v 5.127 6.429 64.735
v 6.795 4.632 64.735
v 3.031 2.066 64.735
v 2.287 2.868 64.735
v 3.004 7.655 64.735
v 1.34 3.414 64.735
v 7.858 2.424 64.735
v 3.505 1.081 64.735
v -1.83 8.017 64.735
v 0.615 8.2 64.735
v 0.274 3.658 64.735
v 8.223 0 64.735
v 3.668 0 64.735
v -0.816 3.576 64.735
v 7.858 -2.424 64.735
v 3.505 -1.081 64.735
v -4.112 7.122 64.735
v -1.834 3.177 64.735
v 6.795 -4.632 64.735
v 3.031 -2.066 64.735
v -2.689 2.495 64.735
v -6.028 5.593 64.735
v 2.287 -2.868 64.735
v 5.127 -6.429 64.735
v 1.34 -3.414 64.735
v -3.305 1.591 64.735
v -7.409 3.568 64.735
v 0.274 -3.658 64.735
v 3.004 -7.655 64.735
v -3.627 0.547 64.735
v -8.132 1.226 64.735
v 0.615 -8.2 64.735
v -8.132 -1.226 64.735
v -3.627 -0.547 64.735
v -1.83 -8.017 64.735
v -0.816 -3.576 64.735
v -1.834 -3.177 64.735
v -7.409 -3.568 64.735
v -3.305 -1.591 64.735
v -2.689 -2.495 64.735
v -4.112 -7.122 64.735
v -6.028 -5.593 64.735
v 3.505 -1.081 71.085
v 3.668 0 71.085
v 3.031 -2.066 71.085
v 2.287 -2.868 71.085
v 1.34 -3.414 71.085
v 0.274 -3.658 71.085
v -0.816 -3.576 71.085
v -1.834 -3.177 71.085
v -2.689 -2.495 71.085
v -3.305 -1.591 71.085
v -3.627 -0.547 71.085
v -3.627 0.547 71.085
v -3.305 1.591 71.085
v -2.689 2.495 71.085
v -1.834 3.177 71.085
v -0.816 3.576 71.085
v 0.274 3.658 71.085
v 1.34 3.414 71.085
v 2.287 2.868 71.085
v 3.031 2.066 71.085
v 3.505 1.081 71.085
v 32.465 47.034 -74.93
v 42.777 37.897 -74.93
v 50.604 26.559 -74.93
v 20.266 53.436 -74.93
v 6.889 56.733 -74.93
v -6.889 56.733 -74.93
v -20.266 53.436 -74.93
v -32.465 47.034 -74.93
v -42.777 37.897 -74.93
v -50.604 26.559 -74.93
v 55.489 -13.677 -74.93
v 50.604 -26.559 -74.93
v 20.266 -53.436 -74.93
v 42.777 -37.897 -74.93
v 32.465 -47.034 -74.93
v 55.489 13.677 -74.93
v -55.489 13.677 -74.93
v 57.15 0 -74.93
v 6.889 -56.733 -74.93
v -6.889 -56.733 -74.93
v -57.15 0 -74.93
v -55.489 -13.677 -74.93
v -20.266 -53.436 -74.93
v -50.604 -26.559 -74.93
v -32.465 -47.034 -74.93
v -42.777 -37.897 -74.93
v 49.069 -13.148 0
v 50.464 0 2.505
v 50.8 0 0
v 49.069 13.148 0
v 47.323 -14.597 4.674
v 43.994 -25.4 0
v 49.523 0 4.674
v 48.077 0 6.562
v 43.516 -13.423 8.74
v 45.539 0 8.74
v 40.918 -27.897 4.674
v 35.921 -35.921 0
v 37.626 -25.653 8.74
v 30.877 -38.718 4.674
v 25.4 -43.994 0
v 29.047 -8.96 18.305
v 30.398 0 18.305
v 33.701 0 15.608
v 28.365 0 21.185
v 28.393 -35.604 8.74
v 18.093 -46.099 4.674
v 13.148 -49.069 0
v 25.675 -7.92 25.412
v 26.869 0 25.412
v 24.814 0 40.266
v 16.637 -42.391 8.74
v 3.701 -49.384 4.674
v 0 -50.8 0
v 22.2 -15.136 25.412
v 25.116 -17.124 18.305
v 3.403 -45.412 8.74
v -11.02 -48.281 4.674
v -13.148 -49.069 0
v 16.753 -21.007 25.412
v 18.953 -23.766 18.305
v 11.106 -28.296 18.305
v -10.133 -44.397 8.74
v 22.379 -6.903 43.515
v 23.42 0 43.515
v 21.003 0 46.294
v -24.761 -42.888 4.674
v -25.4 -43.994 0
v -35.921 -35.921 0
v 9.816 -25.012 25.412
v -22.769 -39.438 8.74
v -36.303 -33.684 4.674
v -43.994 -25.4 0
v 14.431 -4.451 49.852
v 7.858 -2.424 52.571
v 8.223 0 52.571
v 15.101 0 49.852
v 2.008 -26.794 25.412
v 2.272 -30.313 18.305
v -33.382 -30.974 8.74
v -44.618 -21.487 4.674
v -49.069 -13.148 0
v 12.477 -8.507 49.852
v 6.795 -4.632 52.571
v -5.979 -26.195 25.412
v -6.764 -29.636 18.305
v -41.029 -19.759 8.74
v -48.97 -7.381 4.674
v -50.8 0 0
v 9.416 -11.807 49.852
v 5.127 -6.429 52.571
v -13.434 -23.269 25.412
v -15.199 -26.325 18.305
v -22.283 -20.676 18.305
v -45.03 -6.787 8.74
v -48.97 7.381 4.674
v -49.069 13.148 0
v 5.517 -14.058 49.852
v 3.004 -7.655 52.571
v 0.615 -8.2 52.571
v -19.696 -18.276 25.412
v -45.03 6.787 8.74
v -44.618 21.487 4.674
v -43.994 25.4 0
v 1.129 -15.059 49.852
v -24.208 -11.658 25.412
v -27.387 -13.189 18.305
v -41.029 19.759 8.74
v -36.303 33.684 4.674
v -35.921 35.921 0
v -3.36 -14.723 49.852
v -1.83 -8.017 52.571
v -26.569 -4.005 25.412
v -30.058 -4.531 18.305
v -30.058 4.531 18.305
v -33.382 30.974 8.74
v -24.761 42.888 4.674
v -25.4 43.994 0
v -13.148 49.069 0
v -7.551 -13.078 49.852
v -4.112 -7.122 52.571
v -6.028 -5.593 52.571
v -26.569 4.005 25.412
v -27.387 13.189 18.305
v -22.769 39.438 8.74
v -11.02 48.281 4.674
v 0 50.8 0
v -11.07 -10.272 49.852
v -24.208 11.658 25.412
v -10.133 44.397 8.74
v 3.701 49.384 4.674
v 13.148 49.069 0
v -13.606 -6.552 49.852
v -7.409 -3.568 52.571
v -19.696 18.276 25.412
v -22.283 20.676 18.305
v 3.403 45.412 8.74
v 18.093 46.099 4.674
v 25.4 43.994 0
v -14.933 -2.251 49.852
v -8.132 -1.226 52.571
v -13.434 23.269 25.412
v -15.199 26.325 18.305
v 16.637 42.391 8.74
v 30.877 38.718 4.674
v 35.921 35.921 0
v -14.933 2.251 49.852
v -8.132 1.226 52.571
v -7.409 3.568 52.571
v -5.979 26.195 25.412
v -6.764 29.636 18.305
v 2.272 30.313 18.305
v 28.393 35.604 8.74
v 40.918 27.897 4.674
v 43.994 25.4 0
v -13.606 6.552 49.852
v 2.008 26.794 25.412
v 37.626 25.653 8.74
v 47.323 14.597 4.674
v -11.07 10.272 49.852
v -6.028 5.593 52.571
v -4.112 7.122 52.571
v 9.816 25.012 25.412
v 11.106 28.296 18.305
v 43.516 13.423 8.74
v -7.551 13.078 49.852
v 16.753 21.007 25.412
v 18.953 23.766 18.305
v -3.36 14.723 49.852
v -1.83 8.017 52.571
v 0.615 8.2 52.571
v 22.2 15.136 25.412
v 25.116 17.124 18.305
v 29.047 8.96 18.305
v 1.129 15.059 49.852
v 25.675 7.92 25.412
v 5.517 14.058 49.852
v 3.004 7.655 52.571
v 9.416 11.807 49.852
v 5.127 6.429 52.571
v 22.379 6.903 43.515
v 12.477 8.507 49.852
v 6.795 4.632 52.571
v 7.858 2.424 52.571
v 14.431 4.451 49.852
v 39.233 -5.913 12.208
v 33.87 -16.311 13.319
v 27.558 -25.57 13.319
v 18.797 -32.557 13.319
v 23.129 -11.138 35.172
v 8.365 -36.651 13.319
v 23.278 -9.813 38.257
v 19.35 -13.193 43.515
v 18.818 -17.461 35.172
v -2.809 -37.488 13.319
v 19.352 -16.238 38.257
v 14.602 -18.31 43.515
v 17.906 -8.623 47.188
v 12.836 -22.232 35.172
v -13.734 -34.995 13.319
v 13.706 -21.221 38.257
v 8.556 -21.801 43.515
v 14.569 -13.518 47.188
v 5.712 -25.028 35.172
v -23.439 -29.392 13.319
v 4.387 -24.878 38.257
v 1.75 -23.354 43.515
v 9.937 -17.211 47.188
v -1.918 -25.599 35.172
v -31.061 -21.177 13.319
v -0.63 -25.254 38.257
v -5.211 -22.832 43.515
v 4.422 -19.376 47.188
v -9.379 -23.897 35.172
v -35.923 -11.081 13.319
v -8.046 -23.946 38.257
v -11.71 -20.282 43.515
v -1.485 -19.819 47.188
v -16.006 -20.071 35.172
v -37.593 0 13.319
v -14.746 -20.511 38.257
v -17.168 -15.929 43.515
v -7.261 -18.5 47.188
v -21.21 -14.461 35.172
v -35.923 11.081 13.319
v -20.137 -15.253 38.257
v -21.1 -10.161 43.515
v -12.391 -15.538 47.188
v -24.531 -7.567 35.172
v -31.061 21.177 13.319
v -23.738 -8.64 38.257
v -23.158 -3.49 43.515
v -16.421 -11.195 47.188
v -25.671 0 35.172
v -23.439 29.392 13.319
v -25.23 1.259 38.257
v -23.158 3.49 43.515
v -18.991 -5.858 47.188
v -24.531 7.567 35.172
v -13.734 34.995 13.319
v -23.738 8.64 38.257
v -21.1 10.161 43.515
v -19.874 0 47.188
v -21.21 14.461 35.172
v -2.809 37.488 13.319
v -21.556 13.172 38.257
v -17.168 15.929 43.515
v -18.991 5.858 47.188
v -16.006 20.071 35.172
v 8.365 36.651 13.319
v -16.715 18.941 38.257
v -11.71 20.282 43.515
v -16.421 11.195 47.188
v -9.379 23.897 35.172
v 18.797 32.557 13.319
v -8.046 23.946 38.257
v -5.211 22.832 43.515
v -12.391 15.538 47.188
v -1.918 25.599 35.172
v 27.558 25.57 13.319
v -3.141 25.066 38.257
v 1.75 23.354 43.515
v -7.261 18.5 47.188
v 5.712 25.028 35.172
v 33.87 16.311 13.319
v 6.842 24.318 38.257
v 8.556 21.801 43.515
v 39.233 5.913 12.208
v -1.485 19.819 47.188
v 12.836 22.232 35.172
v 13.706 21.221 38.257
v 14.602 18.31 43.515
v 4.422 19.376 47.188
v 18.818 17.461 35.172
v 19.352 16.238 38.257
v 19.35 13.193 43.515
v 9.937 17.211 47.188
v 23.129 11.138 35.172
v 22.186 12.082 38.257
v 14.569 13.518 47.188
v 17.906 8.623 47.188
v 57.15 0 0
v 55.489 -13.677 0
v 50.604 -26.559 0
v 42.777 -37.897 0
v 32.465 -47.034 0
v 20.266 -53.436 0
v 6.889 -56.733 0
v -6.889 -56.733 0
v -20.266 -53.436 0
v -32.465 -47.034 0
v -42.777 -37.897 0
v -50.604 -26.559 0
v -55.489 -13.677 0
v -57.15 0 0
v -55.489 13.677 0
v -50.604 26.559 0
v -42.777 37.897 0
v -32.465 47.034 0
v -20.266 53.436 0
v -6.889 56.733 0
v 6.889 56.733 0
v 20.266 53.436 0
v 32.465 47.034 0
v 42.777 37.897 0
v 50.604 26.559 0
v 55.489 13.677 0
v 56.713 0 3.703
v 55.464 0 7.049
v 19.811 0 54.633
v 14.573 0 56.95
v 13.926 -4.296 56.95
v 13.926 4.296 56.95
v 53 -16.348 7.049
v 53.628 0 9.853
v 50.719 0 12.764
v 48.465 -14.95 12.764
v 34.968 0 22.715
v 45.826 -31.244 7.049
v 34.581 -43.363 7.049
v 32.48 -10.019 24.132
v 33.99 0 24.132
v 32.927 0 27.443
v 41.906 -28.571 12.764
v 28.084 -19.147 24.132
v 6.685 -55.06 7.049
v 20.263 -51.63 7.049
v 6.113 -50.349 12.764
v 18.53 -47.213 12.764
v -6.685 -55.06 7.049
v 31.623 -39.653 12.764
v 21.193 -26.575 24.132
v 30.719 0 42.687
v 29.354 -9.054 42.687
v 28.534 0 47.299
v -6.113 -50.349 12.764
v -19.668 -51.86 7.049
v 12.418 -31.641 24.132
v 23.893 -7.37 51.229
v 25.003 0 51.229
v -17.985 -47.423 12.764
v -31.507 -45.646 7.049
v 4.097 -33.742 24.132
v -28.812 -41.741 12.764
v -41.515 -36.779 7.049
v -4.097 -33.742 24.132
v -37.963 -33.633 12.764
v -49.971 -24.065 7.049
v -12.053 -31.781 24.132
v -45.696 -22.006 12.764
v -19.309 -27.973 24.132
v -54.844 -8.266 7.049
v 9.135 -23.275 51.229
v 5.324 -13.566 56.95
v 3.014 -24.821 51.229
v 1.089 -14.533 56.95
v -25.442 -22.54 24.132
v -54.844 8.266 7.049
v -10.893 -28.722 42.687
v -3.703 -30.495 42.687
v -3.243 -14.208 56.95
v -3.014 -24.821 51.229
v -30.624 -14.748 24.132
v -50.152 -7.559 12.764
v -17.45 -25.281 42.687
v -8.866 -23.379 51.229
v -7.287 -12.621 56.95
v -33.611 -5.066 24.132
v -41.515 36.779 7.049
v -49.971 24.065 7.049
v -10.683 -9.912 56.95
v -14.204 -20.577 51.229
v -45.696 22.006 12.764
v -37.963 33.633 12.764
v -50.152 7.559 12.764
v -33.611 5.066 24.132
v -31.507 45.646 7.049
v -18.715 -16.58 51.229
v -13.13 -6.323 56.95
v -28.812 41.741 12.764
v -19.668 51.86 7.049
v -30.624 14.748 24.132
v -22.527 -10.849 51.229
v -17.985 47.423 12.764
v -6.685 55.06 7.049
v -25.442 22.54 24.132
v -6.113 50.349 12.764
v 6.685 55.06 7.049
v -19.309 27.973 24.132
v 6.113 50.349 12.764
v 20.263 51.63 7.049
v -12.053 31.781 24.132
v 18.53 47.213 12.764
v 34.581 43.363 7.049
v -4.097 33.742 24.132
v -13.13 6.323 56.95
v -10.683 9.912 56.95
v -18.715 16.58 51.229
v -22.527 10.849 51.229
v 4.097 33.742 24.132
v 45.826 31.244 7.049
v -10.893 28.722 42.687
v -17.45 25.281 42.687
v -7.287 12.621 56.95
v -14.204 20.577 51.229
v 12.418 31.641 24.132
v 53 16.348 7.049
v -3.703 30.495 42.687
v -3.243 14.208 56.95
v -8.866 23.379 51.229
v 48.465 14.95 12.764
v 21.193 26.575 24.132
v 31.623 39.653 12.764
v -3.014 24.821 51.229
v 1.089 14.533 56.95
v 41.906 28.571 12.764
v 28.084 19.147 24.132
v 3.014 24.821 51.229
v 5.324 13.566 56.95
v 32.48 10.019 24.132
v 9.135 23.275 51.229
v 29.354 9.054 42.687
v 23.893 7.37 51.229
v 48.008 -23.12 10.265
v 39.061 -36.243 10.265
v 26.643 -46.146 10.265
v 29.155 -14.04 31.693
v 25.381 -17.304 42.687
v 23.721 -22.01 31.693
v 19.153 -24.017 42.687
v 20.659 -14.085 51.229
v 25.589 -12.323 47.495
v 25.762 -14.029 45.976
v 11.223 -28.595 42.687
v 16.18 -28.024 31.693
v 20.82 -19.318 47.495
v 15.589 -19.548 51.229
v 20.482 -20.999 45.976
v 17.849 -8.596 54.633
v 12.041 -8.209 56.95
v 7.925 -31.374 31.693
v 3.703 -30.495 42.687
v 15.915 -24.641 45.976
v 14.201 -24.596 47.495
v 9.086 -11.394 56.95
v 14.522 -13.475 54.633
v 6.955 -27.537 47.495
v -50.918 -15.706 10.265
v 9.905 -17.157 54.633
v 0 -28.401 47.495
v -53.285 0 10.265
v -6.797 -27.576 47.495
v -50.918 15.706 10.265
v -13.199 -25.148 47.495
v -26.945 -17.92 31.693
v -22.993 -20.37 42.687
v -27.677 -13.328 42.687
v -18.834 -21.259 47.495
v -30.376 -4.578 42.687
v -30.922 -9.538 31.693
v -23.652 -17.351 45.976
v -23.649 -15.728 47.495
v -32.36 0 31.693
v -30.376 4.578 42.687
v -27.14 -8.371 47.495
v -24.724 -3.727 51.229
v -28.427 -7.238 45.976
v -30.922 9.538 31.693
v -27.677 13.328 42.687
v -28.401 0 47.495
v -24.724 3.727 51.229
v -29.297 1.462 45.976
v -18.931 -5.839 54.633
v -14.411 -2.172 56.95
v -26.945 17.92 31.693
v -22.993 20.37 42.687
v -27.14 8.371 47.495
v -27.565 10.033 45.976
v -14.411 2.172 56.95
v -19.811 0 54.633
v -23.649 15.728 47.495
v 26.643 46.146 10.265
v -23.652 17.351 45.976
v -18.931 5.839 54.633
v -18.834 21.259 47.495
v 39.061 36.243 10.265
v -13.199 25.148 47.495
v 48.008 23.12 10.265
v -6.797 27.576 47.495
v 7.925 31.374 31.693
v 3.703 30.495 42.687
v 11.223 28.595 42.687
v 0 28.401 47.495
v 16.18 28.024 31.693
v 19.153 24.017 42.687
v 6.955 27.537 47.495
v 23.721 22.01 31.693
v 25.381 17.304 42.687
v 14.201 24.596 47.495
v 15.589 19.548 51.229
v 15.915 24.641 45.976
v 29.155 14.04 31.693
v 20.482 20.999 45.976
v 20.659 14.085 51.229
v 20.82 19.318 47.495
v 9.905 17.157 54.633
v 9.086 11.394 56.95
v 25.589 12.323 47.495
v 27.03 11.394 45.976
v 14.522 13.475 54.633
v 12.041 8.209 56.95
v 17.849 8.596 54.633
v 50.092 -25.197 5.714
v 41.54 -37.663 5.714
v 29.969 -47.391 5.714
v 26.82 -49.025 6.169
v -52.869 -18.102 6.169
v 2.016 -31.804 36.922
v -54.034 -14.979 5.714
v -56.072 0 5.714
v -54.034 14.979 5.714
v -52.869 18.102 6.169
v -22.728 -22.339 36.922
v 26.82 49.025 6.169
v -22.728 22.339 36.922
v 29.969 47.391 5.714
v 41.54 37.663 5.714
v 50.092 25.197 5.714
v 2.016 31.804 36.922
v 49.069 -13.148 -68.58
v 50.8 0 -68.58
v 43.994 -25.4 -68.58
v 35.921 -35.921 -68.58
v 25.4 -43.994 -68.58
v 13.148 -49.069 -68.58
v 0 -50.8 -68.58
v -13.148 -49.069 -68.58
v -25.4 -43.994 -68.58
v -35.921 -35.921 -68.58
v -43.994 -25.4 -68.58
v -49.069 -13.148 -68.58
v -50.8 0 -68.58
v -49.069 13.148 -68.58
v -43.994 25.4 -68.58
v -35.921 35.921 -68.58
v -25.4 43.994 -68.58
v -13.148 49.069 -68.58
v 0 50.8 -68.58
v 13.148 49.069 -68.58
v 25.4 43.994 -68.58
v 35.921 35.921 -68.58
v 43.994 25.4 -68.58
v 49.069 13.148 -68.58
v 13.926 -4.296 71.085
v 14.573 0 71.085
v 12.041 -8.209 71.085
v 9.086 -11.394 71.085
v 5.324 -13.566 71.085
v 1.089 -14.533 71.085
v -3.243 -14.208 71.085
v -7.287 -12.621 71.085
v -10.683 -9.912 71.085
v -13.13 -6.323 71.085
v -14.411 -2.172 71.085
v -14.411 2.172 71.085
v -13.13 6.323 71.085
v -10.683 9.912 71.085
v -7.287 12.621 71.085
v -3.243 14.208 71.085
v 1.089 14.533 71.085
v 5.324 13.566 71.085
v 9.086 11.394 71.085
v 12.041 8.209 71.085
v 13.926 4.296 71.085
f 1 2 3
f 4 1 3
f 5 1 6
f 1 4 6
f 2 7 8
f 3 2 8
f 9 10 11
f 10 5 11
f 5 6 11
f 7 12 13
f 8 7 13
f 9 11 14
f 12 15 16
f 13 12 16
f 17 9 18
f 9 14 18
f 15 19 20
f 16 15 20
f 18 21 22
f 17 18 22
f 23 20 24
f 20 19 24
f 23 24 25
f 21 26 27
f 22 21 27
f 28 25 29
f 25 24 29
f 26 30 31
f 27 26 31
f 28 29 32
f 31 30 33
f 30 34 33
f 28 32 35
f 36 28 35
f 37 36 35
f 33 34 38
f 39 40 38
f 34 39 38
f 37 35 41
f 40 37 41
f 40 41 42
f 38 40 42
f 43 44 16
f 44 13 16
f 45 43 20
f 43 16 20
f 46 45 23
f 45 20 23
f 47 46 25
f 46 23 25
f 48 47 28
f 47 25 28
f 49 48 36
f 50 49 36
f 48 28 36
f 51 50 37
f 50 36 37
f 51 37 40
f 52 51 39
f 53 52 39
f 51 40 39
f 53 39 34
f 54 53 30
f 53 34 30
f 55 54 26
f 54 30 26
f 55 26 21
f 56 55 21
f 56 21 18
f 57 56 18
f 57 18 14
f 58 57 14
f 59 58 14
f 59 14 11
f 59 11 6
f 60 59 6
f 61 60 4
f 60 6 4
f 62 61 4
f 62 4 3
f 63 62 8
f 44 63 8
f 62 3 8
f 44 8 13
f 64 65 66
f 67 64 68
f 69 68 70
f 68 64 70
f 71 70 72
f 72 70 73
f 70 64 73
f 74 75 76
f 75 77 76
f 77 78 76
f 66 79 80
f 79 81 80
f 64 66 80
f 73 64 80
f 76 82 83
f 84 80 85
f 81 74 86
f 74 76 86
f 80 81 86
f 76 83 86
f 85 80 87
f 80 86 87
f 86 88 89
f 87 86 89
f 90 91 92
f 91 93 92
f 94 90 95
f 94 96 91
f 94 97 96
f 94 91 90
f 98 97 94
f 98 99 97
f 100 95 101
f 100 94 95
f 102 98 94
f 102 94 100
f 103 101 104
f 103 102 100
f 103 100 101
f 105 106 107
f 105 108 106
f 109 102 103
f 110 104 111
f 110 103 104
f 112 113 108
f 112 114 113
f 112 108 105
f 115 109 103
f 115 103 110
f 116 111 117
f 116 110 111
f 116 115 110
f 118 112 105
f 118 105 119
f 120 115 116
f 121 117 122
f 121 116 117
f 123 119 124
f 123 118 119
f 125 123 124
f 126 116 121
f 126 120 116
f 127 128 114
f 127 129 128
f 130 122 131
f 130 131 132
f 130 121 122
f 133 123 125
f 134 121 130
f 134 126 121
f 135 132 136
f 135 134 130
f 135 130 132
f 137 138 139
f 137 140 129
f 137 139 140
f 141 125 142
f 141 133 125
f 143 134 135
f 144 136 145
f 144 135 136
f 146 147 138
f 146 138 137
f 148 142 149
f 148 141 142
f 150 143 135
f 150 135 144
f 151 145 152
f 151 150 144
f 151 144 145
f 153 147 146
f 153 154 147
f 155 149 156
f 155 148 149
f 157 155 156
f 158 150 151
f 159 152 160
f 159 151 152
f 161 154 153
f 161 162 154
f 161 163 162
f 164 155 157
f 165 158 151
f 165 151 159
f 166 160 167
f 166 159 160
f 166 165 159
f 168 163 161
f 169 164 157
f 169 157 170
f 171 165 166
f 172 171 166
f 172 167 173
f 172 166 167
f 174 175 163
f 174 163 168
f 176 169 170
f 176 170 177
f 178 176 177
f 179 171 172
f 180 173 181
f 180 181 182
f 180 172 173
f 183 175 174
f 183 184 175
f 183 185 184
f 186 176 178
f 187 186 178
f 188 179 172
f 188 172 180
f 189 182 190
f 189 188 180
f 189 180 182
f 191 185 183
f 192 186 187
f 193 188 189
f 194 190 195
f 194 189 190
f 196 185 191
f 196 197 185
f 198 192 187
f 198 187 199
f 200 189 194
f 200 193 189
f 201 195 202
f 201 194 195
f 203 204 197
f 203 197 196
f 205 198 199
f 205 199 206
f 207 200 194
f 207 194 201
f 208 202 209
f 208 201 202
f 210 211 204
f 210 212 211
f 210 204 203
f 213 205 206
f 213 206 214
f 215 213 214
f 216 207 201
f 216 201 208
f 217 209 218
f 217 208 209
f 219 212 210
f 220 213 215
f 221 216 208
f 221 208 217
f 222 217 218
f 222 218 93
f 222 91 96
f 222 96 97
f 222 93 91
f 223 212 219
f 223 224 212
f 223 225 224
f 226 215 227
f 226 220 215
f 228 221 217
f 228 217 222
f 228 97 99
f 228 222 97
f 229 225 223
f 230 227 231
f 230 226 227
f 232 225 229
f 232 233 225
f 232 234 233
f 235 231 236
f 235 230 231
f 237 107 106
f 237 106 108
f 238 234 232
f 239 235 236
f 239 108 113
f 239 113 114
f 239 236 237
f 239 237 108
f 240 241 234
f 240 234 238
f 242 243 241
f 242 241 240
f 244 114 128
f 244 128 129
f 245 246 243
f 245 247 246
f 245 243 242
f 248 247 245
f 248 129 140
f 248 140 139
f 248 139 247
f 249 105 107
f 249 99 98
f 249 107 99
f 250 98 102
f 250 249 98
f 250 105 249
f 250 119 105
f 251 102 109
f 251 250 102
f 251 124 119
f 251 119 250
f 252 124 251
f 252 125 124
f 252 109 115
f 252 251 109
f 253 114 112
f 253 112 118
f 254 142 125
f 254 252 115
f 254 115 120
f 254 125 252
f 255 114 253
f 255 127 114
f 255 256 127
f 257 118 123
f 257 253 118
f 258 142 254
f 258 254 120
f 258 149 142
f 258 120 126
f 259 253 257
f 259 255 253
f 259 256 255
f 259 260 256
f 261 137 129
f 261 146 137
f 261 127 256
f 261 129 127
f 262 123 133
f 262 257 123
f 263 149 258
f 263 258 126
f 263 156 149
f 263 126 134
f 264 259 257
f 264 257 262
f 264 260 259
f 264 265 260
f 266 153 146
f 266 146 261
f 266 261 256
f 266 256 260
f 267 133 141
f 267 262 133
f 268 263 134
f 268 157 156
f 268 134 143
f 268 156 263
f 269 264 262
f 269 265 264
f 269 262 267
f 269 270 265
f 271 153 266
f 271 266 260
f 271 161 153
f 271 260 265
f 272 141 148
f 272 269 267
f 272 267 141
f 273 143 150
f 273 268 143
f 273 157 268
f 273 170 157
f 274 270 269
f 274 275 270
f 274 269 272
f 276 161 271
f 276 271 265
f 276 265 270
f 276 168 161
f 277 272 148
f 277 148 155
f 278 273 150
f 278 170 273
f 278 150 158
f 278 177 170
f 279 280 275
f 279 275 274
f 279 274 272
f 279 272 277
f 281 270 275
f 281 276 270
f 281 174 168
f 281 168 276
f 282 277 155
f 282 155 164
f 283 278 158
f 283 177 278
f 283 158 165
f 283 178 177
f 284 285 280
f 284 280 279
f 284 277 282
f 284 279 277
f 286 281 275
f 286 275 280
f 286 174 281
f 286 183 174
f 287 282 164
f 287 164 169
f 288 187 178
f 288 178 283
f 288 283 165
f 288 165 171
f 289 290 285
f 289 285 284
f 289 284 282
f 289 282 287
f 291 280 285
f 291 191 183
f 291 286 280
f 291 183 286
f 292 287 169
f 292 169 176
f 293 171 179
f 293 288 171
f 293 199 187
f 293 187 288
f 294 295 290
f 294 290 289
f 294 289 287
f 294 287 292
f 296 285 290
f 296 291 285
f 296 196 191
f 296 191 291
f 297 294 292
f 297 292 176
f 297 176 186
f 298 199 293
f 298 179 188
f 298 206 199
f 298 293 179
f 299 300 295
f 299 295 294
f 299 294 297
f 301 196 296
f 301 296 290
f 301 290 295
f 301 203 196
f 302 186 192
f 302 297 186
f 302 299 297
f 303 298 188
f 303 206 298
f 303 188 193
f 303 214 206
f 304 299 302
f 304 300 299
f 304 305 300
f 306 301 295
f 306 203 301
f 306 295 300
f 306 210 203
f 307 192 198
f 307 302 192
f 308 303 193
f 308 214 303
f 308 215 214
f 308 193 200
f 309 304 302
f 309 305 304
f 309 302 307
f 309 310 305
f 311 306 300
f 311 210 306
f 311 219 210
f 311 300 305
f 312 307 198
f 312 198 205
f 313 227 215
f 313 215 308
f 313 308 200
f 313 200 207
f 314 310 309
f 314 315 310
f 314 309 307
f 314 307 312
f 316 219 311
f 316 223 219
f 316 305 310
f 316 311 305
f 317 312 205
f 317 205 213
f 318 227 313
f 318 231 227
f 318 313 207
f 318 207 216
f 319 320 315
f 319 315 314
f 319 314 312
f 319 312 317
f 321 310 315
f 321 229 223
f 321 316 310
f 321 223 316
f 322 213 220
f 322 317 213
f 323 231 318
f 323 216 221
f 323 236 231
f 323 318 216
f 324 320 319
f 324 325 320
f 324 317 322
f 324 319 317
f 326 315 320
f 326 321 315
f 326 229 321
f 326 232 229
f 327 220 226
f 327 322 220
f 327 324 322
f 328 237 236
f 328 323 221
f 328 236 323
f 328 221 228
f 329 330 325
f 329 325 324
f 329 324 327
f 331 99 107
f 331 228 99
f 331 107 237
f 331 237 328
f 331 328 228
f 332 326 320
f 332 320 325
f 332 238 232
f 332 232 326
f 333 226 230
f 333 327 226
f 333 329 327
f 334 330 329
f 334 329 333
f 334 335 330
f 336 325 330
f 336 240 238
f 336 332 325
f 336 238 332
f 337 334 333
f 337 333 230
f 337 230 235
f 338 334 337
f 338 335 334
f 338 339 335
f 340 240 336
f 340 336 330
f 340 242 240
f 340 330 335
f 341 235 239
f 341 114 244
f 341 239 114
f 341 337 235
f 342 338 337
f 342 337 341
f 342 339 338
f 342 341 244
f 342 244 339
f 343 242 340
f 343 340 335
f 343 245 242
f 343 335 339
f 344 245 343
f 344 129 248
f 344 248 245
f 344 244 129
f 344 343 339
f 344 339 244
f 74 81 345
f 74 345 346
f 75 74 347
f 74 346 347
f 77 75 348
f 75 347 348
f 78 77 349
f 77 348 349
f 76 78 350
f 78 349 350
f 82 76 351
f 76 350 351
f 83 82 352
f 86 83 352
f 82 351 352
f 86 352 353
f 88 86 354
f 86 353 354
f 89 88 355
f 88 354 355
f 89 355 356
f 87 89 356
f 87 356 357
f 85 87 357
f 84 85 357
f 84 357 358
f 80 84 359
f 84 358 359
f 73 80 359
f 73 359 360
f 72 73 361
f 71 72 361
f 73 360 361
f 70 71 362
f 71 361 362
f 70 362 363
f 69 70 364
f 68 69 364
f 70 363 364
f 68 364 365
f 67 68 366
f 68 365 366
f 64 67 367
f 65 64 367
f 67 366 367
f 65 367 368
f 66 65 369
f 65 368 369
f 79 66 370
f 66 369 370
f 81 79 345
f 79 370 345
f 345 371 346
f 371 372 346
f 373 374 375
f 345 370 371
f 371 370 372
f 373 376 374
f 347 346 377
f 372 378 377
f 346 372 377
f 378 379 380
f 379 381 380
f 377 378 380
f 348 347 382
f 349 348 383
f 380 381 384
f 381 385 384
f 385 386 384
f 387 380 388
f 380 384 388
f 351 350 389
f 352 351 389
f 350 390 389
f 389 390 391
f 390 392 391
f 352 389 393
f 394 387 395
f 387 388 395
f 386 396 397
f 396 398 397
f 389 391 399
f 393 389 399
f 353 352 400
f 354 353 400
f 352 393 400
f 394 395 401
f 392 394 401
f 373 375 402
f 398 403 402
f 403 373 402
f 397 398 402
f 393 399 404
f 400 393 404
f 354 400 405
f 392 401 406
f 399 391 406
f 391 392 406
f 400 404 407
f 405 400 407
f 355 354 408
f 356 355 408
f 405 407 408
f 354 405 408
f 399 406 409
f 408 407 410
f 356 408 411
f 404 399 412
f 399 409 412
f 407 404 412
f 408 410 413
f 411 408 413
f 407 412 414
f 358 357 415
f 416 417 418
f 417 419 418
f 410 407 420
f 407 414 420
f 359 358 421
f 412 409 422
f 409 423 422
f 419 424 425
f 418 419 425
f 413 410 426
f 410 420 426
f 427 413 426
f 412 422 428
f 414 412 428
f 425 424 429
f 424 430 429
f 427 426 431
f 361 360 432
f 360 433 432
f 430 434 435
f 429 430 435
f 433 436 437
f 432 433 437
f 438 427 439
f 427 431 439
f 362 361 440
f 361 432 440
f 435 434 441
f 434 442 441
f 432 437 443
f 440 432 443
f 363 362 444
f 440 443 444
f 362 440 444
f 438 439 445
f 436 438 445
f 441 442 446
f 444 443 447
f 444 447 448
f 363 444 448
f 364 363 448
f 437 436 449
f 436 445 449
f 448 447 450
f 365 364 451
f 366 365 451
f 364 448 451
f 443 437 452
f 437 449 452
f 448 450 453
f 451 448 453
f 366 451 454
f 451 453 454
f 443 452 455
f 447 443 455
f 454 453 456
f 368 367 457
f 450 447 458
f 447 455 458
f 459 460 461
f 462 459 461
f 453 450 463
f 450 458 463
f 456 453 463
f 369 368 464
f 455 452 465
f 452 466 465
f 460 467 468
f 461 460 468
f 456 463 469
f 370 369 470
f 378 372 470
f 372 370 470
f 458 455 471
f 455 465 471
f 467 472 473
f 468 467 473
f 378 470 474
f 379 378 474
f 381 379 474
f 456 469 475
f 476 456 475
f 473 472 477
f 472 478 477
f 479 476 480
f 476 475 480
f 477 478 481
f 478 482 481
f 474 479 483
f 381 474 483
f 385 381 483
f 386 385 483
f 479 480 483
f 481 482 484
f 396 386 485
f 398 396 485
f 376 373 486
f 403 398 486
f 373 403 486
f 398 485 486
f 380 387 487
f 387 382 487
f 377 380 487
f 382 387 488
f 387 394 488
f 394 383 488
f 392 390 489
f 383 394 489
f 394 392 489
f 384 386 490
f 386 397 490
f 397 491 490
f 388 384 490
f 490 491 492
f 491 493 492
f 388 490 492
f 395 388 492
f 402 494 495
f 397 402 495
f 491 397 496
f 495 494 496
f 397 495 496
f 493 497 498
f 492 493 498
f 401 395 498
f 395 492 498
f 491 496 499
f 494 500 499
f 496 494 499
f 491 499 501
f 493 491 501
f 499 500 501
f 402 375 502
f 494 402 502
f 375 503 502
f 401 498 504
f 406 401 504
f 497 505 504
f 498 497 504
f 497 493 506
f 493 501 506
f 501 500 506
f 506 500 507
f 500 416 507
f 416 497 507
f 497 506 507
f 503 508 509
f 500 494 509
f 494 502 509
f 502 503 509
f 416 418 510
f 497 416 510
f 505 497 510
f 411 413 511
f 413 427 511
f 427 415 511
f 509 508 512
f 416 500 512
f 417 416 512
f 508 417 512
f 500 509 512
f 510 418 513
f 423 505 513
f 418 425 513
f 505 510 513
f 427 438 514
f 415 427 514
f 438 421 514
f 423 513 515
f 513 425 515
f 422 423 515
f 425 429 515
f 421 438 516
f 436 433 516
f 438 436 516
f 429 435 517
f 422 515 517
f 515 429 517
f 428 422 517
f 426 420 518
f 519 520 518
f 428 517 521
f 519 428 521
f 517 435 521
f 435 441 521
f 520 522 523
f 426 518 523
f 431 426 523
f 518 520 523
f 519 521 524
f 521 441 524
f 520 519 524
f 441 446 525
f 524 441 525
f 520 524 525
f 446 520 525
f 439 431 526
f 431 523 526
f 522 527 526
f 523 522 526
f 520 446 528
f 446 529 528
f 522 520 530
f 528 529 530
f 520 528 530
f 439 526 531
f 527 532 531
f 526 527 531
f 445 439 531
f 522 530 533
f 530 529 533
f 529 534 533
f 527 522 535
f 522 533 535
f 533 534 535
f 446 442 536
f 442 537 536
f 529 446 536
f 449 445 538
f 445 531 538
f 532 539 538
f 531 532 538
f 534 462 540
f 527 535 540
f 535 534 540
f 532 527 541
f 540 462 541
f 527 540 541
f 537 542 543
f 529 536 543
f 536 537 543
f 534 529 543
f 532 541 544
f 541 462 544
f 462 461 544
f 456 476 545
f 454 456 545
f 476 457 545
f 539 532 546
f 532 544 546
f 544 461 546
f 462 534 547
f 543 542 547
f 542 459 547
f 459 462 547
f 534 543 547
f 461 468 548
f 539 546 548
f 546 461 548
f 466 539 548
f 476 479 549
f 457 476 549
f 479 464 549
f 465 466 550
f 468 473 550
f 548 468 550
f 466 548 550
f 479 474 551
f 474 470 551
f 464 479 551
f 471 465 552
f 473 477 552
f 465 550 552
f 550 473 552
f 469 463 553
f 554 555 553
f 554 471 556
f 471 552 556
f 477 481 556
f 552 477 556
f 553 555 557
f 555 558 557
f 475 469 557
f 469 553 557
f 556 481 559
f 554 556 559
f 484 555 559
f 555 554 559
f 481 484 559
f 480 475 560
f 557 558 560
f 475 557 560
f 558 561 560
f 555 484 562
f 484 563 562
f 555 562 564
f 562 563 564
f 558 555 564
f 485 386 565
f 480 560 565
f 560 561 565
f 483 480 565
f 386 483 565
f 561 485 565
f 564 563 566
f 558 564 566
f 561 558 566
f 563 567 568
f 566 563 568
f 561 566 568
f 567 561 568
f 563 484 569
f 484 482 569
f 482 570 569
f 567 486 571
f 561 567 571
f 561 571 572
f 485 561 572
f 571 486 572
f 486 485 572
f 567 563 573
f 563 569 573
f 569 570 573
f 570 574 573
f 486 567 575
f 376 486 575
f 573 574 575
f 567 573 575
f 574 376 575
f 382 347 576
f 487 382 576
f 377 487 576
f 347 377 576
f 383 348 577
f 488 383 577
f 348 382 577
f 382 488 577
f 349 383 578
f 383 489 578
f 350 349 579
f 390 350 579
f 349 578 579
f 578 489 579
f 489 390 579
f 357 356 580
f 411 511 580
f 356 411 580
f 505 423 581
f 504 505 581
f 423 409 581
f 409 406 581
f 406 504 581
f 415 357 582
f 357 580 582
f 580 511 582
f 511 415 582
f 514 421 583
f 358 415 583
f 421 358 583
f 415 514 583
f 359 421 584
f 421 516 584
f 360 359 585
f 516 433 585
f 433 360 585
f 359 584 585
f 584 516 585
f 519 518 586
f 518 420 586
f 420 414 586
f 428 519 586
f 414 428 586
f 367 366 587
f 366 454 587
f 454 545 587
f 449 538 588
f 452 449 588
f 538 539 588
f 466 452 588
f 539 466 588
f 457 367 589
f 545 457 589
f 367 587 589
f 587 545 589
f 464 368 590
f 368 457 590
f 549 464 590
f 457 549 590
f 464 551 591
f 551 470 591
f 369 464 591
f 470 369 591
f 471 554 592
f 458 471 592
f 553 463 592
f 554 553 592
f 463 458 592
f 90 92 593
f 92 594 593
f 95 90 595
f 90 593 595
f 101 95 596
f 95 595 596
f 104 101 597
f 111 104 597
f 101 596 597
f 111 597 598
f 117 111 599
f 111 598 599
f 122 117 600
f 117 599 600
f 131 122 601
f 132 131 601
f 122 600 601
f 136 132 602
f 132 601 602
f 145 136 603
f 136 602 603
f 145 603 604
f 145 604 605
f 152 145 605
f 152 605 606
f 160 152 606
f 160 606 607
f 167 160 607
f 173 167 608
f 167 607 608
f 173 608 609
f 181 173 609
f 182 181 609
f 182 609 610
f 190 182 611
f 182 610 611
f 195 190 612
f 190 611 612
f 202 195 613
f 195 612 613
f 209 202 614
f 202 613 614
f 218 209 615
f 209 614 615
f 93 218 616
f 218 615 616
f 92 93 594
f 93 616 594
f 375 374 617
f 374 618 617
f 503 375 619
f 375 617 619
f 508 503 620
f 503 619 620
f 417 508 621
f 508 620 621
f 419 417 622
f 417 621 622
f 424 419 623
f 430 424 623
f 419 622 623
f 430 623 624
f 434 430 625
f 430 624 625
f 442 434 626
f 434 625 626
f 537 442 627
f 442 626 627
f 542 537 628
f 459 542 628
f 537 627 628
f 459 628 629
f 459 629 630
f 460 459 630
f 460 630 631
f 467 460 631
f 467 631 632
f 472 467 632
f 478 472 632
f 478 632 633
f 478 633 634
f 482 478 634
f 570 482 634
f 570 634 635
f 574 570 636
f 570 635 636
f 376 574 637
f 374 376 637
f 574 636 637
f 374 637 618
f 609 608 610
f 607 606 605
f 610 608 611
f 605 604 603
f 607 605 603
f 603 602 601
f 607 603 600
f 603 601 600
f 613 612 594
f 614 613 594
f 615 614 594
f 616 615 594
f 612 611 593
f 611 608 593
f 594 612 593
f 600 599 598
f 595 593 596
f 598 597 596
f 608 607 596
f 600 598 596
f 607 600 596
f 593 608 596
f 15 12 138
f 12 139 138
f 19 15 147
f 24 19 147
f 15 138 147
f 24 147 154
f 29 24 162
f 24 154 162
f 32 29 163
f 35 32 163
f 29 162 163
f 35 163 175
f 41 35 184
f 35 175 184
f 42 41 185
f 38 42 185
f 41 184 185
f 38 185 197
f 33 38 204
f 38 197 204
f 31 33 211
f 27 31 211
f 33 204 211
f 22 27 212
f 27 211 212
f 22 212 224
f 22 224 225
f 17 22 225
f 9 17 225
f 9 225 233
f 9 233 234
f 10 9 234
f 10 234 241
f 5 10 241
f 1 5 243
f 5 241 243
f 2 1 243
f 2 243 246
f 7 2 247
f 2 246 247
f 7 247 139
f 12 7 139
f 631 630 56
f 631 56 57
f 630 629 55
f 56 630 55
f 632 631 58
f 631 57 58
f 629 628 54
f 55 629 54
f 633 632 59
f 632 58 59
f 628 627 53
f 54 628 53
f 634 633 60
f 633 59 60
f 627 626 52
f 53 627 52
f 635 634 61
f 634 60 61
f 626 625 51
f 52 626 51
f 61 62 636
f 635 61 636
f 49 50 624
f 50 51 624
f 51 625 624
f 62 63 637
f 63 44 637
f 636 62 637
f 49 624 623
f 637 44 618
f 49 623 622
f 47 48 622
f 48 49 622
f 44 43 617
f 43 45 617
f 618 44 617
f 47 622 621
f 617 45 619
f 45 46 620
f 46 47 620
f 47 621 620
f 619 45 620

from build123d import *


# Not quite as in the source:
# - ends of sketch curves that miss each other by under 0.0002 mm in the source are joined
# - the dataset's text gives a spline's control points without its knots; the knots are read off the source's solid


with BuildPart() as f1:
    # F0 (on Front) → F1 (revolve)
    with BuildSketch(Plane.XZ):
        with BuildLine():
            Line((50.8, -68.5799818198), (0, -68.5799818198))
            Line((0, -68.5799818198), (0, -74.9299818198))
            Line((0, -74.9299818198), (57.15, -74.9299818198))
            Line((57.15, -74.9299818198), (57.15, 1.6272e-06))
            add(Edge.make_bspline(
                [(57.15, 1.6272e-06), (57.1499999994, 0.7047113918), (57.0598999162, 2.103273417), (56.6515693983, 4.1275628276), (55.9891831776, 6.0294834035), (55.1137080803, 7.7693366077), (54.0770742303, 9.3282529906), (52.5451803539, 11.1692858227), (50.4535495865, 13.0673465504), (47.8521882716, 14.8916410503), (45.252819746, 16.425180894), (42.7316484966, 17.7782729868), (40.3709871587, 19.0241328449), (38.6175601714, 20.0091031011), (37.3964709607, 20.7693815862), (36.5848410934, 21.3222974779), (35.889165019, 21.8521978188), (35.3187701783, 22.3490647419), (34.9484904994, 22.7282804416), (34.7161027204, 23.0004508821), (34.5495368253, 23.2155139733), (34.3902675999, 23.4425507333), (34.1858485185, 23.7641041974), (33.8467702825, 24.3818175191), (33.4109284532, 25.4497498628), (32.9816573877, 27.0498729284), (32.6545525856, 28.932648506), (32.411932376, 31.0443557544), (32.2145322917, 33.3333465292), (32.0061617084, 35.7596304469), (31.7139430509, 38.2985913452), (31.3207822666, 40.5019809383), (30.8480072544, 42.315454933), (30.4671278129, 43.4684021236), (30.0993683091, 44.3969660699), (29.7863286696, 45.0992011119), (29.4431534601, 45.7843141536), (28.9514880524, 46.6664553198), (28.2759351057, 47.710924054), (27.0873755974, 49.2504932123), (25.4420689363, 50.9266202701), (23.3260377998, 52.5809069603), (21.1425673416, 53.9478206558), (18.9367386048, 55.0958122319), (16.73909063, 56.0833338186), (15.292731043, 56.6675944469), (14.5776358142, 56.9480177287), (14.5734167567, 56.9496719276)],
                knots=[1.95e-08, 1.95e-08, 1.95e-08, 1.95e-08, 0.015625, 0.03125, 0.046875, 0.0625, 0.078125, 0.09375, 0.125, 0.15625, 0.1875, 0.21875, 0.25, 0.28125, 0.296875, 0.3125, 0.328125, 0.34375, 0.359375, 0.3671875, 0.375, 0.3828125, 0.390625, 0.40625, 0.4375, 0.46875, 0.5, 0.53125, 0.5625, 0.59375, 0.625, 0.65625, 0.671875, 0.6875, 0.6953125, 0.703125, 0.7109375, 0.71875, 0.734375, 0.75, 0.78125, 0.8125, 0.84375, 0.875, 0.90625, 0.9375, 0.9376854849, 0.9376854849, 0.9376854849, 0.9376854849], degree=3))
            Line((14.5734167567, 56.9496719276), (14.5734162837, 71.0851369262))
            Line((14.5734162837, 71.0851369262), (3.6679329351, 71.0851369262))
            Line((3.6679329351, 71.0851369262), (3.6679329351, 64.7351369262))
            Line((3.6679329351, 64.7351369262), (8.2234162837, 64.7351369262))
            Line((8.2234162837, 64.7351369262), (8.2234162837, 52.5710880756))
            add(Edge.make_bspline(
                [(50.8, 0), (50.8000016062, 10.1355050023), (21.8530368998, 13.6006812311), (29.227455035, 45.4185092323), (14.6406068987, 50.1267635615), (8.2234162837, 52.5710880756)],
                knots=[0, 0, 0, 0, 0.3637012491, 0.7015500616, 1, 1, 1, 1], degree=3))
            Line((50.8, 0), (50.8, -68.5799818198))
        make_face()
    revolve(axis=Axis((0, 0, -71.7549818198), (0, 0, -1)))


solid = f1.part
